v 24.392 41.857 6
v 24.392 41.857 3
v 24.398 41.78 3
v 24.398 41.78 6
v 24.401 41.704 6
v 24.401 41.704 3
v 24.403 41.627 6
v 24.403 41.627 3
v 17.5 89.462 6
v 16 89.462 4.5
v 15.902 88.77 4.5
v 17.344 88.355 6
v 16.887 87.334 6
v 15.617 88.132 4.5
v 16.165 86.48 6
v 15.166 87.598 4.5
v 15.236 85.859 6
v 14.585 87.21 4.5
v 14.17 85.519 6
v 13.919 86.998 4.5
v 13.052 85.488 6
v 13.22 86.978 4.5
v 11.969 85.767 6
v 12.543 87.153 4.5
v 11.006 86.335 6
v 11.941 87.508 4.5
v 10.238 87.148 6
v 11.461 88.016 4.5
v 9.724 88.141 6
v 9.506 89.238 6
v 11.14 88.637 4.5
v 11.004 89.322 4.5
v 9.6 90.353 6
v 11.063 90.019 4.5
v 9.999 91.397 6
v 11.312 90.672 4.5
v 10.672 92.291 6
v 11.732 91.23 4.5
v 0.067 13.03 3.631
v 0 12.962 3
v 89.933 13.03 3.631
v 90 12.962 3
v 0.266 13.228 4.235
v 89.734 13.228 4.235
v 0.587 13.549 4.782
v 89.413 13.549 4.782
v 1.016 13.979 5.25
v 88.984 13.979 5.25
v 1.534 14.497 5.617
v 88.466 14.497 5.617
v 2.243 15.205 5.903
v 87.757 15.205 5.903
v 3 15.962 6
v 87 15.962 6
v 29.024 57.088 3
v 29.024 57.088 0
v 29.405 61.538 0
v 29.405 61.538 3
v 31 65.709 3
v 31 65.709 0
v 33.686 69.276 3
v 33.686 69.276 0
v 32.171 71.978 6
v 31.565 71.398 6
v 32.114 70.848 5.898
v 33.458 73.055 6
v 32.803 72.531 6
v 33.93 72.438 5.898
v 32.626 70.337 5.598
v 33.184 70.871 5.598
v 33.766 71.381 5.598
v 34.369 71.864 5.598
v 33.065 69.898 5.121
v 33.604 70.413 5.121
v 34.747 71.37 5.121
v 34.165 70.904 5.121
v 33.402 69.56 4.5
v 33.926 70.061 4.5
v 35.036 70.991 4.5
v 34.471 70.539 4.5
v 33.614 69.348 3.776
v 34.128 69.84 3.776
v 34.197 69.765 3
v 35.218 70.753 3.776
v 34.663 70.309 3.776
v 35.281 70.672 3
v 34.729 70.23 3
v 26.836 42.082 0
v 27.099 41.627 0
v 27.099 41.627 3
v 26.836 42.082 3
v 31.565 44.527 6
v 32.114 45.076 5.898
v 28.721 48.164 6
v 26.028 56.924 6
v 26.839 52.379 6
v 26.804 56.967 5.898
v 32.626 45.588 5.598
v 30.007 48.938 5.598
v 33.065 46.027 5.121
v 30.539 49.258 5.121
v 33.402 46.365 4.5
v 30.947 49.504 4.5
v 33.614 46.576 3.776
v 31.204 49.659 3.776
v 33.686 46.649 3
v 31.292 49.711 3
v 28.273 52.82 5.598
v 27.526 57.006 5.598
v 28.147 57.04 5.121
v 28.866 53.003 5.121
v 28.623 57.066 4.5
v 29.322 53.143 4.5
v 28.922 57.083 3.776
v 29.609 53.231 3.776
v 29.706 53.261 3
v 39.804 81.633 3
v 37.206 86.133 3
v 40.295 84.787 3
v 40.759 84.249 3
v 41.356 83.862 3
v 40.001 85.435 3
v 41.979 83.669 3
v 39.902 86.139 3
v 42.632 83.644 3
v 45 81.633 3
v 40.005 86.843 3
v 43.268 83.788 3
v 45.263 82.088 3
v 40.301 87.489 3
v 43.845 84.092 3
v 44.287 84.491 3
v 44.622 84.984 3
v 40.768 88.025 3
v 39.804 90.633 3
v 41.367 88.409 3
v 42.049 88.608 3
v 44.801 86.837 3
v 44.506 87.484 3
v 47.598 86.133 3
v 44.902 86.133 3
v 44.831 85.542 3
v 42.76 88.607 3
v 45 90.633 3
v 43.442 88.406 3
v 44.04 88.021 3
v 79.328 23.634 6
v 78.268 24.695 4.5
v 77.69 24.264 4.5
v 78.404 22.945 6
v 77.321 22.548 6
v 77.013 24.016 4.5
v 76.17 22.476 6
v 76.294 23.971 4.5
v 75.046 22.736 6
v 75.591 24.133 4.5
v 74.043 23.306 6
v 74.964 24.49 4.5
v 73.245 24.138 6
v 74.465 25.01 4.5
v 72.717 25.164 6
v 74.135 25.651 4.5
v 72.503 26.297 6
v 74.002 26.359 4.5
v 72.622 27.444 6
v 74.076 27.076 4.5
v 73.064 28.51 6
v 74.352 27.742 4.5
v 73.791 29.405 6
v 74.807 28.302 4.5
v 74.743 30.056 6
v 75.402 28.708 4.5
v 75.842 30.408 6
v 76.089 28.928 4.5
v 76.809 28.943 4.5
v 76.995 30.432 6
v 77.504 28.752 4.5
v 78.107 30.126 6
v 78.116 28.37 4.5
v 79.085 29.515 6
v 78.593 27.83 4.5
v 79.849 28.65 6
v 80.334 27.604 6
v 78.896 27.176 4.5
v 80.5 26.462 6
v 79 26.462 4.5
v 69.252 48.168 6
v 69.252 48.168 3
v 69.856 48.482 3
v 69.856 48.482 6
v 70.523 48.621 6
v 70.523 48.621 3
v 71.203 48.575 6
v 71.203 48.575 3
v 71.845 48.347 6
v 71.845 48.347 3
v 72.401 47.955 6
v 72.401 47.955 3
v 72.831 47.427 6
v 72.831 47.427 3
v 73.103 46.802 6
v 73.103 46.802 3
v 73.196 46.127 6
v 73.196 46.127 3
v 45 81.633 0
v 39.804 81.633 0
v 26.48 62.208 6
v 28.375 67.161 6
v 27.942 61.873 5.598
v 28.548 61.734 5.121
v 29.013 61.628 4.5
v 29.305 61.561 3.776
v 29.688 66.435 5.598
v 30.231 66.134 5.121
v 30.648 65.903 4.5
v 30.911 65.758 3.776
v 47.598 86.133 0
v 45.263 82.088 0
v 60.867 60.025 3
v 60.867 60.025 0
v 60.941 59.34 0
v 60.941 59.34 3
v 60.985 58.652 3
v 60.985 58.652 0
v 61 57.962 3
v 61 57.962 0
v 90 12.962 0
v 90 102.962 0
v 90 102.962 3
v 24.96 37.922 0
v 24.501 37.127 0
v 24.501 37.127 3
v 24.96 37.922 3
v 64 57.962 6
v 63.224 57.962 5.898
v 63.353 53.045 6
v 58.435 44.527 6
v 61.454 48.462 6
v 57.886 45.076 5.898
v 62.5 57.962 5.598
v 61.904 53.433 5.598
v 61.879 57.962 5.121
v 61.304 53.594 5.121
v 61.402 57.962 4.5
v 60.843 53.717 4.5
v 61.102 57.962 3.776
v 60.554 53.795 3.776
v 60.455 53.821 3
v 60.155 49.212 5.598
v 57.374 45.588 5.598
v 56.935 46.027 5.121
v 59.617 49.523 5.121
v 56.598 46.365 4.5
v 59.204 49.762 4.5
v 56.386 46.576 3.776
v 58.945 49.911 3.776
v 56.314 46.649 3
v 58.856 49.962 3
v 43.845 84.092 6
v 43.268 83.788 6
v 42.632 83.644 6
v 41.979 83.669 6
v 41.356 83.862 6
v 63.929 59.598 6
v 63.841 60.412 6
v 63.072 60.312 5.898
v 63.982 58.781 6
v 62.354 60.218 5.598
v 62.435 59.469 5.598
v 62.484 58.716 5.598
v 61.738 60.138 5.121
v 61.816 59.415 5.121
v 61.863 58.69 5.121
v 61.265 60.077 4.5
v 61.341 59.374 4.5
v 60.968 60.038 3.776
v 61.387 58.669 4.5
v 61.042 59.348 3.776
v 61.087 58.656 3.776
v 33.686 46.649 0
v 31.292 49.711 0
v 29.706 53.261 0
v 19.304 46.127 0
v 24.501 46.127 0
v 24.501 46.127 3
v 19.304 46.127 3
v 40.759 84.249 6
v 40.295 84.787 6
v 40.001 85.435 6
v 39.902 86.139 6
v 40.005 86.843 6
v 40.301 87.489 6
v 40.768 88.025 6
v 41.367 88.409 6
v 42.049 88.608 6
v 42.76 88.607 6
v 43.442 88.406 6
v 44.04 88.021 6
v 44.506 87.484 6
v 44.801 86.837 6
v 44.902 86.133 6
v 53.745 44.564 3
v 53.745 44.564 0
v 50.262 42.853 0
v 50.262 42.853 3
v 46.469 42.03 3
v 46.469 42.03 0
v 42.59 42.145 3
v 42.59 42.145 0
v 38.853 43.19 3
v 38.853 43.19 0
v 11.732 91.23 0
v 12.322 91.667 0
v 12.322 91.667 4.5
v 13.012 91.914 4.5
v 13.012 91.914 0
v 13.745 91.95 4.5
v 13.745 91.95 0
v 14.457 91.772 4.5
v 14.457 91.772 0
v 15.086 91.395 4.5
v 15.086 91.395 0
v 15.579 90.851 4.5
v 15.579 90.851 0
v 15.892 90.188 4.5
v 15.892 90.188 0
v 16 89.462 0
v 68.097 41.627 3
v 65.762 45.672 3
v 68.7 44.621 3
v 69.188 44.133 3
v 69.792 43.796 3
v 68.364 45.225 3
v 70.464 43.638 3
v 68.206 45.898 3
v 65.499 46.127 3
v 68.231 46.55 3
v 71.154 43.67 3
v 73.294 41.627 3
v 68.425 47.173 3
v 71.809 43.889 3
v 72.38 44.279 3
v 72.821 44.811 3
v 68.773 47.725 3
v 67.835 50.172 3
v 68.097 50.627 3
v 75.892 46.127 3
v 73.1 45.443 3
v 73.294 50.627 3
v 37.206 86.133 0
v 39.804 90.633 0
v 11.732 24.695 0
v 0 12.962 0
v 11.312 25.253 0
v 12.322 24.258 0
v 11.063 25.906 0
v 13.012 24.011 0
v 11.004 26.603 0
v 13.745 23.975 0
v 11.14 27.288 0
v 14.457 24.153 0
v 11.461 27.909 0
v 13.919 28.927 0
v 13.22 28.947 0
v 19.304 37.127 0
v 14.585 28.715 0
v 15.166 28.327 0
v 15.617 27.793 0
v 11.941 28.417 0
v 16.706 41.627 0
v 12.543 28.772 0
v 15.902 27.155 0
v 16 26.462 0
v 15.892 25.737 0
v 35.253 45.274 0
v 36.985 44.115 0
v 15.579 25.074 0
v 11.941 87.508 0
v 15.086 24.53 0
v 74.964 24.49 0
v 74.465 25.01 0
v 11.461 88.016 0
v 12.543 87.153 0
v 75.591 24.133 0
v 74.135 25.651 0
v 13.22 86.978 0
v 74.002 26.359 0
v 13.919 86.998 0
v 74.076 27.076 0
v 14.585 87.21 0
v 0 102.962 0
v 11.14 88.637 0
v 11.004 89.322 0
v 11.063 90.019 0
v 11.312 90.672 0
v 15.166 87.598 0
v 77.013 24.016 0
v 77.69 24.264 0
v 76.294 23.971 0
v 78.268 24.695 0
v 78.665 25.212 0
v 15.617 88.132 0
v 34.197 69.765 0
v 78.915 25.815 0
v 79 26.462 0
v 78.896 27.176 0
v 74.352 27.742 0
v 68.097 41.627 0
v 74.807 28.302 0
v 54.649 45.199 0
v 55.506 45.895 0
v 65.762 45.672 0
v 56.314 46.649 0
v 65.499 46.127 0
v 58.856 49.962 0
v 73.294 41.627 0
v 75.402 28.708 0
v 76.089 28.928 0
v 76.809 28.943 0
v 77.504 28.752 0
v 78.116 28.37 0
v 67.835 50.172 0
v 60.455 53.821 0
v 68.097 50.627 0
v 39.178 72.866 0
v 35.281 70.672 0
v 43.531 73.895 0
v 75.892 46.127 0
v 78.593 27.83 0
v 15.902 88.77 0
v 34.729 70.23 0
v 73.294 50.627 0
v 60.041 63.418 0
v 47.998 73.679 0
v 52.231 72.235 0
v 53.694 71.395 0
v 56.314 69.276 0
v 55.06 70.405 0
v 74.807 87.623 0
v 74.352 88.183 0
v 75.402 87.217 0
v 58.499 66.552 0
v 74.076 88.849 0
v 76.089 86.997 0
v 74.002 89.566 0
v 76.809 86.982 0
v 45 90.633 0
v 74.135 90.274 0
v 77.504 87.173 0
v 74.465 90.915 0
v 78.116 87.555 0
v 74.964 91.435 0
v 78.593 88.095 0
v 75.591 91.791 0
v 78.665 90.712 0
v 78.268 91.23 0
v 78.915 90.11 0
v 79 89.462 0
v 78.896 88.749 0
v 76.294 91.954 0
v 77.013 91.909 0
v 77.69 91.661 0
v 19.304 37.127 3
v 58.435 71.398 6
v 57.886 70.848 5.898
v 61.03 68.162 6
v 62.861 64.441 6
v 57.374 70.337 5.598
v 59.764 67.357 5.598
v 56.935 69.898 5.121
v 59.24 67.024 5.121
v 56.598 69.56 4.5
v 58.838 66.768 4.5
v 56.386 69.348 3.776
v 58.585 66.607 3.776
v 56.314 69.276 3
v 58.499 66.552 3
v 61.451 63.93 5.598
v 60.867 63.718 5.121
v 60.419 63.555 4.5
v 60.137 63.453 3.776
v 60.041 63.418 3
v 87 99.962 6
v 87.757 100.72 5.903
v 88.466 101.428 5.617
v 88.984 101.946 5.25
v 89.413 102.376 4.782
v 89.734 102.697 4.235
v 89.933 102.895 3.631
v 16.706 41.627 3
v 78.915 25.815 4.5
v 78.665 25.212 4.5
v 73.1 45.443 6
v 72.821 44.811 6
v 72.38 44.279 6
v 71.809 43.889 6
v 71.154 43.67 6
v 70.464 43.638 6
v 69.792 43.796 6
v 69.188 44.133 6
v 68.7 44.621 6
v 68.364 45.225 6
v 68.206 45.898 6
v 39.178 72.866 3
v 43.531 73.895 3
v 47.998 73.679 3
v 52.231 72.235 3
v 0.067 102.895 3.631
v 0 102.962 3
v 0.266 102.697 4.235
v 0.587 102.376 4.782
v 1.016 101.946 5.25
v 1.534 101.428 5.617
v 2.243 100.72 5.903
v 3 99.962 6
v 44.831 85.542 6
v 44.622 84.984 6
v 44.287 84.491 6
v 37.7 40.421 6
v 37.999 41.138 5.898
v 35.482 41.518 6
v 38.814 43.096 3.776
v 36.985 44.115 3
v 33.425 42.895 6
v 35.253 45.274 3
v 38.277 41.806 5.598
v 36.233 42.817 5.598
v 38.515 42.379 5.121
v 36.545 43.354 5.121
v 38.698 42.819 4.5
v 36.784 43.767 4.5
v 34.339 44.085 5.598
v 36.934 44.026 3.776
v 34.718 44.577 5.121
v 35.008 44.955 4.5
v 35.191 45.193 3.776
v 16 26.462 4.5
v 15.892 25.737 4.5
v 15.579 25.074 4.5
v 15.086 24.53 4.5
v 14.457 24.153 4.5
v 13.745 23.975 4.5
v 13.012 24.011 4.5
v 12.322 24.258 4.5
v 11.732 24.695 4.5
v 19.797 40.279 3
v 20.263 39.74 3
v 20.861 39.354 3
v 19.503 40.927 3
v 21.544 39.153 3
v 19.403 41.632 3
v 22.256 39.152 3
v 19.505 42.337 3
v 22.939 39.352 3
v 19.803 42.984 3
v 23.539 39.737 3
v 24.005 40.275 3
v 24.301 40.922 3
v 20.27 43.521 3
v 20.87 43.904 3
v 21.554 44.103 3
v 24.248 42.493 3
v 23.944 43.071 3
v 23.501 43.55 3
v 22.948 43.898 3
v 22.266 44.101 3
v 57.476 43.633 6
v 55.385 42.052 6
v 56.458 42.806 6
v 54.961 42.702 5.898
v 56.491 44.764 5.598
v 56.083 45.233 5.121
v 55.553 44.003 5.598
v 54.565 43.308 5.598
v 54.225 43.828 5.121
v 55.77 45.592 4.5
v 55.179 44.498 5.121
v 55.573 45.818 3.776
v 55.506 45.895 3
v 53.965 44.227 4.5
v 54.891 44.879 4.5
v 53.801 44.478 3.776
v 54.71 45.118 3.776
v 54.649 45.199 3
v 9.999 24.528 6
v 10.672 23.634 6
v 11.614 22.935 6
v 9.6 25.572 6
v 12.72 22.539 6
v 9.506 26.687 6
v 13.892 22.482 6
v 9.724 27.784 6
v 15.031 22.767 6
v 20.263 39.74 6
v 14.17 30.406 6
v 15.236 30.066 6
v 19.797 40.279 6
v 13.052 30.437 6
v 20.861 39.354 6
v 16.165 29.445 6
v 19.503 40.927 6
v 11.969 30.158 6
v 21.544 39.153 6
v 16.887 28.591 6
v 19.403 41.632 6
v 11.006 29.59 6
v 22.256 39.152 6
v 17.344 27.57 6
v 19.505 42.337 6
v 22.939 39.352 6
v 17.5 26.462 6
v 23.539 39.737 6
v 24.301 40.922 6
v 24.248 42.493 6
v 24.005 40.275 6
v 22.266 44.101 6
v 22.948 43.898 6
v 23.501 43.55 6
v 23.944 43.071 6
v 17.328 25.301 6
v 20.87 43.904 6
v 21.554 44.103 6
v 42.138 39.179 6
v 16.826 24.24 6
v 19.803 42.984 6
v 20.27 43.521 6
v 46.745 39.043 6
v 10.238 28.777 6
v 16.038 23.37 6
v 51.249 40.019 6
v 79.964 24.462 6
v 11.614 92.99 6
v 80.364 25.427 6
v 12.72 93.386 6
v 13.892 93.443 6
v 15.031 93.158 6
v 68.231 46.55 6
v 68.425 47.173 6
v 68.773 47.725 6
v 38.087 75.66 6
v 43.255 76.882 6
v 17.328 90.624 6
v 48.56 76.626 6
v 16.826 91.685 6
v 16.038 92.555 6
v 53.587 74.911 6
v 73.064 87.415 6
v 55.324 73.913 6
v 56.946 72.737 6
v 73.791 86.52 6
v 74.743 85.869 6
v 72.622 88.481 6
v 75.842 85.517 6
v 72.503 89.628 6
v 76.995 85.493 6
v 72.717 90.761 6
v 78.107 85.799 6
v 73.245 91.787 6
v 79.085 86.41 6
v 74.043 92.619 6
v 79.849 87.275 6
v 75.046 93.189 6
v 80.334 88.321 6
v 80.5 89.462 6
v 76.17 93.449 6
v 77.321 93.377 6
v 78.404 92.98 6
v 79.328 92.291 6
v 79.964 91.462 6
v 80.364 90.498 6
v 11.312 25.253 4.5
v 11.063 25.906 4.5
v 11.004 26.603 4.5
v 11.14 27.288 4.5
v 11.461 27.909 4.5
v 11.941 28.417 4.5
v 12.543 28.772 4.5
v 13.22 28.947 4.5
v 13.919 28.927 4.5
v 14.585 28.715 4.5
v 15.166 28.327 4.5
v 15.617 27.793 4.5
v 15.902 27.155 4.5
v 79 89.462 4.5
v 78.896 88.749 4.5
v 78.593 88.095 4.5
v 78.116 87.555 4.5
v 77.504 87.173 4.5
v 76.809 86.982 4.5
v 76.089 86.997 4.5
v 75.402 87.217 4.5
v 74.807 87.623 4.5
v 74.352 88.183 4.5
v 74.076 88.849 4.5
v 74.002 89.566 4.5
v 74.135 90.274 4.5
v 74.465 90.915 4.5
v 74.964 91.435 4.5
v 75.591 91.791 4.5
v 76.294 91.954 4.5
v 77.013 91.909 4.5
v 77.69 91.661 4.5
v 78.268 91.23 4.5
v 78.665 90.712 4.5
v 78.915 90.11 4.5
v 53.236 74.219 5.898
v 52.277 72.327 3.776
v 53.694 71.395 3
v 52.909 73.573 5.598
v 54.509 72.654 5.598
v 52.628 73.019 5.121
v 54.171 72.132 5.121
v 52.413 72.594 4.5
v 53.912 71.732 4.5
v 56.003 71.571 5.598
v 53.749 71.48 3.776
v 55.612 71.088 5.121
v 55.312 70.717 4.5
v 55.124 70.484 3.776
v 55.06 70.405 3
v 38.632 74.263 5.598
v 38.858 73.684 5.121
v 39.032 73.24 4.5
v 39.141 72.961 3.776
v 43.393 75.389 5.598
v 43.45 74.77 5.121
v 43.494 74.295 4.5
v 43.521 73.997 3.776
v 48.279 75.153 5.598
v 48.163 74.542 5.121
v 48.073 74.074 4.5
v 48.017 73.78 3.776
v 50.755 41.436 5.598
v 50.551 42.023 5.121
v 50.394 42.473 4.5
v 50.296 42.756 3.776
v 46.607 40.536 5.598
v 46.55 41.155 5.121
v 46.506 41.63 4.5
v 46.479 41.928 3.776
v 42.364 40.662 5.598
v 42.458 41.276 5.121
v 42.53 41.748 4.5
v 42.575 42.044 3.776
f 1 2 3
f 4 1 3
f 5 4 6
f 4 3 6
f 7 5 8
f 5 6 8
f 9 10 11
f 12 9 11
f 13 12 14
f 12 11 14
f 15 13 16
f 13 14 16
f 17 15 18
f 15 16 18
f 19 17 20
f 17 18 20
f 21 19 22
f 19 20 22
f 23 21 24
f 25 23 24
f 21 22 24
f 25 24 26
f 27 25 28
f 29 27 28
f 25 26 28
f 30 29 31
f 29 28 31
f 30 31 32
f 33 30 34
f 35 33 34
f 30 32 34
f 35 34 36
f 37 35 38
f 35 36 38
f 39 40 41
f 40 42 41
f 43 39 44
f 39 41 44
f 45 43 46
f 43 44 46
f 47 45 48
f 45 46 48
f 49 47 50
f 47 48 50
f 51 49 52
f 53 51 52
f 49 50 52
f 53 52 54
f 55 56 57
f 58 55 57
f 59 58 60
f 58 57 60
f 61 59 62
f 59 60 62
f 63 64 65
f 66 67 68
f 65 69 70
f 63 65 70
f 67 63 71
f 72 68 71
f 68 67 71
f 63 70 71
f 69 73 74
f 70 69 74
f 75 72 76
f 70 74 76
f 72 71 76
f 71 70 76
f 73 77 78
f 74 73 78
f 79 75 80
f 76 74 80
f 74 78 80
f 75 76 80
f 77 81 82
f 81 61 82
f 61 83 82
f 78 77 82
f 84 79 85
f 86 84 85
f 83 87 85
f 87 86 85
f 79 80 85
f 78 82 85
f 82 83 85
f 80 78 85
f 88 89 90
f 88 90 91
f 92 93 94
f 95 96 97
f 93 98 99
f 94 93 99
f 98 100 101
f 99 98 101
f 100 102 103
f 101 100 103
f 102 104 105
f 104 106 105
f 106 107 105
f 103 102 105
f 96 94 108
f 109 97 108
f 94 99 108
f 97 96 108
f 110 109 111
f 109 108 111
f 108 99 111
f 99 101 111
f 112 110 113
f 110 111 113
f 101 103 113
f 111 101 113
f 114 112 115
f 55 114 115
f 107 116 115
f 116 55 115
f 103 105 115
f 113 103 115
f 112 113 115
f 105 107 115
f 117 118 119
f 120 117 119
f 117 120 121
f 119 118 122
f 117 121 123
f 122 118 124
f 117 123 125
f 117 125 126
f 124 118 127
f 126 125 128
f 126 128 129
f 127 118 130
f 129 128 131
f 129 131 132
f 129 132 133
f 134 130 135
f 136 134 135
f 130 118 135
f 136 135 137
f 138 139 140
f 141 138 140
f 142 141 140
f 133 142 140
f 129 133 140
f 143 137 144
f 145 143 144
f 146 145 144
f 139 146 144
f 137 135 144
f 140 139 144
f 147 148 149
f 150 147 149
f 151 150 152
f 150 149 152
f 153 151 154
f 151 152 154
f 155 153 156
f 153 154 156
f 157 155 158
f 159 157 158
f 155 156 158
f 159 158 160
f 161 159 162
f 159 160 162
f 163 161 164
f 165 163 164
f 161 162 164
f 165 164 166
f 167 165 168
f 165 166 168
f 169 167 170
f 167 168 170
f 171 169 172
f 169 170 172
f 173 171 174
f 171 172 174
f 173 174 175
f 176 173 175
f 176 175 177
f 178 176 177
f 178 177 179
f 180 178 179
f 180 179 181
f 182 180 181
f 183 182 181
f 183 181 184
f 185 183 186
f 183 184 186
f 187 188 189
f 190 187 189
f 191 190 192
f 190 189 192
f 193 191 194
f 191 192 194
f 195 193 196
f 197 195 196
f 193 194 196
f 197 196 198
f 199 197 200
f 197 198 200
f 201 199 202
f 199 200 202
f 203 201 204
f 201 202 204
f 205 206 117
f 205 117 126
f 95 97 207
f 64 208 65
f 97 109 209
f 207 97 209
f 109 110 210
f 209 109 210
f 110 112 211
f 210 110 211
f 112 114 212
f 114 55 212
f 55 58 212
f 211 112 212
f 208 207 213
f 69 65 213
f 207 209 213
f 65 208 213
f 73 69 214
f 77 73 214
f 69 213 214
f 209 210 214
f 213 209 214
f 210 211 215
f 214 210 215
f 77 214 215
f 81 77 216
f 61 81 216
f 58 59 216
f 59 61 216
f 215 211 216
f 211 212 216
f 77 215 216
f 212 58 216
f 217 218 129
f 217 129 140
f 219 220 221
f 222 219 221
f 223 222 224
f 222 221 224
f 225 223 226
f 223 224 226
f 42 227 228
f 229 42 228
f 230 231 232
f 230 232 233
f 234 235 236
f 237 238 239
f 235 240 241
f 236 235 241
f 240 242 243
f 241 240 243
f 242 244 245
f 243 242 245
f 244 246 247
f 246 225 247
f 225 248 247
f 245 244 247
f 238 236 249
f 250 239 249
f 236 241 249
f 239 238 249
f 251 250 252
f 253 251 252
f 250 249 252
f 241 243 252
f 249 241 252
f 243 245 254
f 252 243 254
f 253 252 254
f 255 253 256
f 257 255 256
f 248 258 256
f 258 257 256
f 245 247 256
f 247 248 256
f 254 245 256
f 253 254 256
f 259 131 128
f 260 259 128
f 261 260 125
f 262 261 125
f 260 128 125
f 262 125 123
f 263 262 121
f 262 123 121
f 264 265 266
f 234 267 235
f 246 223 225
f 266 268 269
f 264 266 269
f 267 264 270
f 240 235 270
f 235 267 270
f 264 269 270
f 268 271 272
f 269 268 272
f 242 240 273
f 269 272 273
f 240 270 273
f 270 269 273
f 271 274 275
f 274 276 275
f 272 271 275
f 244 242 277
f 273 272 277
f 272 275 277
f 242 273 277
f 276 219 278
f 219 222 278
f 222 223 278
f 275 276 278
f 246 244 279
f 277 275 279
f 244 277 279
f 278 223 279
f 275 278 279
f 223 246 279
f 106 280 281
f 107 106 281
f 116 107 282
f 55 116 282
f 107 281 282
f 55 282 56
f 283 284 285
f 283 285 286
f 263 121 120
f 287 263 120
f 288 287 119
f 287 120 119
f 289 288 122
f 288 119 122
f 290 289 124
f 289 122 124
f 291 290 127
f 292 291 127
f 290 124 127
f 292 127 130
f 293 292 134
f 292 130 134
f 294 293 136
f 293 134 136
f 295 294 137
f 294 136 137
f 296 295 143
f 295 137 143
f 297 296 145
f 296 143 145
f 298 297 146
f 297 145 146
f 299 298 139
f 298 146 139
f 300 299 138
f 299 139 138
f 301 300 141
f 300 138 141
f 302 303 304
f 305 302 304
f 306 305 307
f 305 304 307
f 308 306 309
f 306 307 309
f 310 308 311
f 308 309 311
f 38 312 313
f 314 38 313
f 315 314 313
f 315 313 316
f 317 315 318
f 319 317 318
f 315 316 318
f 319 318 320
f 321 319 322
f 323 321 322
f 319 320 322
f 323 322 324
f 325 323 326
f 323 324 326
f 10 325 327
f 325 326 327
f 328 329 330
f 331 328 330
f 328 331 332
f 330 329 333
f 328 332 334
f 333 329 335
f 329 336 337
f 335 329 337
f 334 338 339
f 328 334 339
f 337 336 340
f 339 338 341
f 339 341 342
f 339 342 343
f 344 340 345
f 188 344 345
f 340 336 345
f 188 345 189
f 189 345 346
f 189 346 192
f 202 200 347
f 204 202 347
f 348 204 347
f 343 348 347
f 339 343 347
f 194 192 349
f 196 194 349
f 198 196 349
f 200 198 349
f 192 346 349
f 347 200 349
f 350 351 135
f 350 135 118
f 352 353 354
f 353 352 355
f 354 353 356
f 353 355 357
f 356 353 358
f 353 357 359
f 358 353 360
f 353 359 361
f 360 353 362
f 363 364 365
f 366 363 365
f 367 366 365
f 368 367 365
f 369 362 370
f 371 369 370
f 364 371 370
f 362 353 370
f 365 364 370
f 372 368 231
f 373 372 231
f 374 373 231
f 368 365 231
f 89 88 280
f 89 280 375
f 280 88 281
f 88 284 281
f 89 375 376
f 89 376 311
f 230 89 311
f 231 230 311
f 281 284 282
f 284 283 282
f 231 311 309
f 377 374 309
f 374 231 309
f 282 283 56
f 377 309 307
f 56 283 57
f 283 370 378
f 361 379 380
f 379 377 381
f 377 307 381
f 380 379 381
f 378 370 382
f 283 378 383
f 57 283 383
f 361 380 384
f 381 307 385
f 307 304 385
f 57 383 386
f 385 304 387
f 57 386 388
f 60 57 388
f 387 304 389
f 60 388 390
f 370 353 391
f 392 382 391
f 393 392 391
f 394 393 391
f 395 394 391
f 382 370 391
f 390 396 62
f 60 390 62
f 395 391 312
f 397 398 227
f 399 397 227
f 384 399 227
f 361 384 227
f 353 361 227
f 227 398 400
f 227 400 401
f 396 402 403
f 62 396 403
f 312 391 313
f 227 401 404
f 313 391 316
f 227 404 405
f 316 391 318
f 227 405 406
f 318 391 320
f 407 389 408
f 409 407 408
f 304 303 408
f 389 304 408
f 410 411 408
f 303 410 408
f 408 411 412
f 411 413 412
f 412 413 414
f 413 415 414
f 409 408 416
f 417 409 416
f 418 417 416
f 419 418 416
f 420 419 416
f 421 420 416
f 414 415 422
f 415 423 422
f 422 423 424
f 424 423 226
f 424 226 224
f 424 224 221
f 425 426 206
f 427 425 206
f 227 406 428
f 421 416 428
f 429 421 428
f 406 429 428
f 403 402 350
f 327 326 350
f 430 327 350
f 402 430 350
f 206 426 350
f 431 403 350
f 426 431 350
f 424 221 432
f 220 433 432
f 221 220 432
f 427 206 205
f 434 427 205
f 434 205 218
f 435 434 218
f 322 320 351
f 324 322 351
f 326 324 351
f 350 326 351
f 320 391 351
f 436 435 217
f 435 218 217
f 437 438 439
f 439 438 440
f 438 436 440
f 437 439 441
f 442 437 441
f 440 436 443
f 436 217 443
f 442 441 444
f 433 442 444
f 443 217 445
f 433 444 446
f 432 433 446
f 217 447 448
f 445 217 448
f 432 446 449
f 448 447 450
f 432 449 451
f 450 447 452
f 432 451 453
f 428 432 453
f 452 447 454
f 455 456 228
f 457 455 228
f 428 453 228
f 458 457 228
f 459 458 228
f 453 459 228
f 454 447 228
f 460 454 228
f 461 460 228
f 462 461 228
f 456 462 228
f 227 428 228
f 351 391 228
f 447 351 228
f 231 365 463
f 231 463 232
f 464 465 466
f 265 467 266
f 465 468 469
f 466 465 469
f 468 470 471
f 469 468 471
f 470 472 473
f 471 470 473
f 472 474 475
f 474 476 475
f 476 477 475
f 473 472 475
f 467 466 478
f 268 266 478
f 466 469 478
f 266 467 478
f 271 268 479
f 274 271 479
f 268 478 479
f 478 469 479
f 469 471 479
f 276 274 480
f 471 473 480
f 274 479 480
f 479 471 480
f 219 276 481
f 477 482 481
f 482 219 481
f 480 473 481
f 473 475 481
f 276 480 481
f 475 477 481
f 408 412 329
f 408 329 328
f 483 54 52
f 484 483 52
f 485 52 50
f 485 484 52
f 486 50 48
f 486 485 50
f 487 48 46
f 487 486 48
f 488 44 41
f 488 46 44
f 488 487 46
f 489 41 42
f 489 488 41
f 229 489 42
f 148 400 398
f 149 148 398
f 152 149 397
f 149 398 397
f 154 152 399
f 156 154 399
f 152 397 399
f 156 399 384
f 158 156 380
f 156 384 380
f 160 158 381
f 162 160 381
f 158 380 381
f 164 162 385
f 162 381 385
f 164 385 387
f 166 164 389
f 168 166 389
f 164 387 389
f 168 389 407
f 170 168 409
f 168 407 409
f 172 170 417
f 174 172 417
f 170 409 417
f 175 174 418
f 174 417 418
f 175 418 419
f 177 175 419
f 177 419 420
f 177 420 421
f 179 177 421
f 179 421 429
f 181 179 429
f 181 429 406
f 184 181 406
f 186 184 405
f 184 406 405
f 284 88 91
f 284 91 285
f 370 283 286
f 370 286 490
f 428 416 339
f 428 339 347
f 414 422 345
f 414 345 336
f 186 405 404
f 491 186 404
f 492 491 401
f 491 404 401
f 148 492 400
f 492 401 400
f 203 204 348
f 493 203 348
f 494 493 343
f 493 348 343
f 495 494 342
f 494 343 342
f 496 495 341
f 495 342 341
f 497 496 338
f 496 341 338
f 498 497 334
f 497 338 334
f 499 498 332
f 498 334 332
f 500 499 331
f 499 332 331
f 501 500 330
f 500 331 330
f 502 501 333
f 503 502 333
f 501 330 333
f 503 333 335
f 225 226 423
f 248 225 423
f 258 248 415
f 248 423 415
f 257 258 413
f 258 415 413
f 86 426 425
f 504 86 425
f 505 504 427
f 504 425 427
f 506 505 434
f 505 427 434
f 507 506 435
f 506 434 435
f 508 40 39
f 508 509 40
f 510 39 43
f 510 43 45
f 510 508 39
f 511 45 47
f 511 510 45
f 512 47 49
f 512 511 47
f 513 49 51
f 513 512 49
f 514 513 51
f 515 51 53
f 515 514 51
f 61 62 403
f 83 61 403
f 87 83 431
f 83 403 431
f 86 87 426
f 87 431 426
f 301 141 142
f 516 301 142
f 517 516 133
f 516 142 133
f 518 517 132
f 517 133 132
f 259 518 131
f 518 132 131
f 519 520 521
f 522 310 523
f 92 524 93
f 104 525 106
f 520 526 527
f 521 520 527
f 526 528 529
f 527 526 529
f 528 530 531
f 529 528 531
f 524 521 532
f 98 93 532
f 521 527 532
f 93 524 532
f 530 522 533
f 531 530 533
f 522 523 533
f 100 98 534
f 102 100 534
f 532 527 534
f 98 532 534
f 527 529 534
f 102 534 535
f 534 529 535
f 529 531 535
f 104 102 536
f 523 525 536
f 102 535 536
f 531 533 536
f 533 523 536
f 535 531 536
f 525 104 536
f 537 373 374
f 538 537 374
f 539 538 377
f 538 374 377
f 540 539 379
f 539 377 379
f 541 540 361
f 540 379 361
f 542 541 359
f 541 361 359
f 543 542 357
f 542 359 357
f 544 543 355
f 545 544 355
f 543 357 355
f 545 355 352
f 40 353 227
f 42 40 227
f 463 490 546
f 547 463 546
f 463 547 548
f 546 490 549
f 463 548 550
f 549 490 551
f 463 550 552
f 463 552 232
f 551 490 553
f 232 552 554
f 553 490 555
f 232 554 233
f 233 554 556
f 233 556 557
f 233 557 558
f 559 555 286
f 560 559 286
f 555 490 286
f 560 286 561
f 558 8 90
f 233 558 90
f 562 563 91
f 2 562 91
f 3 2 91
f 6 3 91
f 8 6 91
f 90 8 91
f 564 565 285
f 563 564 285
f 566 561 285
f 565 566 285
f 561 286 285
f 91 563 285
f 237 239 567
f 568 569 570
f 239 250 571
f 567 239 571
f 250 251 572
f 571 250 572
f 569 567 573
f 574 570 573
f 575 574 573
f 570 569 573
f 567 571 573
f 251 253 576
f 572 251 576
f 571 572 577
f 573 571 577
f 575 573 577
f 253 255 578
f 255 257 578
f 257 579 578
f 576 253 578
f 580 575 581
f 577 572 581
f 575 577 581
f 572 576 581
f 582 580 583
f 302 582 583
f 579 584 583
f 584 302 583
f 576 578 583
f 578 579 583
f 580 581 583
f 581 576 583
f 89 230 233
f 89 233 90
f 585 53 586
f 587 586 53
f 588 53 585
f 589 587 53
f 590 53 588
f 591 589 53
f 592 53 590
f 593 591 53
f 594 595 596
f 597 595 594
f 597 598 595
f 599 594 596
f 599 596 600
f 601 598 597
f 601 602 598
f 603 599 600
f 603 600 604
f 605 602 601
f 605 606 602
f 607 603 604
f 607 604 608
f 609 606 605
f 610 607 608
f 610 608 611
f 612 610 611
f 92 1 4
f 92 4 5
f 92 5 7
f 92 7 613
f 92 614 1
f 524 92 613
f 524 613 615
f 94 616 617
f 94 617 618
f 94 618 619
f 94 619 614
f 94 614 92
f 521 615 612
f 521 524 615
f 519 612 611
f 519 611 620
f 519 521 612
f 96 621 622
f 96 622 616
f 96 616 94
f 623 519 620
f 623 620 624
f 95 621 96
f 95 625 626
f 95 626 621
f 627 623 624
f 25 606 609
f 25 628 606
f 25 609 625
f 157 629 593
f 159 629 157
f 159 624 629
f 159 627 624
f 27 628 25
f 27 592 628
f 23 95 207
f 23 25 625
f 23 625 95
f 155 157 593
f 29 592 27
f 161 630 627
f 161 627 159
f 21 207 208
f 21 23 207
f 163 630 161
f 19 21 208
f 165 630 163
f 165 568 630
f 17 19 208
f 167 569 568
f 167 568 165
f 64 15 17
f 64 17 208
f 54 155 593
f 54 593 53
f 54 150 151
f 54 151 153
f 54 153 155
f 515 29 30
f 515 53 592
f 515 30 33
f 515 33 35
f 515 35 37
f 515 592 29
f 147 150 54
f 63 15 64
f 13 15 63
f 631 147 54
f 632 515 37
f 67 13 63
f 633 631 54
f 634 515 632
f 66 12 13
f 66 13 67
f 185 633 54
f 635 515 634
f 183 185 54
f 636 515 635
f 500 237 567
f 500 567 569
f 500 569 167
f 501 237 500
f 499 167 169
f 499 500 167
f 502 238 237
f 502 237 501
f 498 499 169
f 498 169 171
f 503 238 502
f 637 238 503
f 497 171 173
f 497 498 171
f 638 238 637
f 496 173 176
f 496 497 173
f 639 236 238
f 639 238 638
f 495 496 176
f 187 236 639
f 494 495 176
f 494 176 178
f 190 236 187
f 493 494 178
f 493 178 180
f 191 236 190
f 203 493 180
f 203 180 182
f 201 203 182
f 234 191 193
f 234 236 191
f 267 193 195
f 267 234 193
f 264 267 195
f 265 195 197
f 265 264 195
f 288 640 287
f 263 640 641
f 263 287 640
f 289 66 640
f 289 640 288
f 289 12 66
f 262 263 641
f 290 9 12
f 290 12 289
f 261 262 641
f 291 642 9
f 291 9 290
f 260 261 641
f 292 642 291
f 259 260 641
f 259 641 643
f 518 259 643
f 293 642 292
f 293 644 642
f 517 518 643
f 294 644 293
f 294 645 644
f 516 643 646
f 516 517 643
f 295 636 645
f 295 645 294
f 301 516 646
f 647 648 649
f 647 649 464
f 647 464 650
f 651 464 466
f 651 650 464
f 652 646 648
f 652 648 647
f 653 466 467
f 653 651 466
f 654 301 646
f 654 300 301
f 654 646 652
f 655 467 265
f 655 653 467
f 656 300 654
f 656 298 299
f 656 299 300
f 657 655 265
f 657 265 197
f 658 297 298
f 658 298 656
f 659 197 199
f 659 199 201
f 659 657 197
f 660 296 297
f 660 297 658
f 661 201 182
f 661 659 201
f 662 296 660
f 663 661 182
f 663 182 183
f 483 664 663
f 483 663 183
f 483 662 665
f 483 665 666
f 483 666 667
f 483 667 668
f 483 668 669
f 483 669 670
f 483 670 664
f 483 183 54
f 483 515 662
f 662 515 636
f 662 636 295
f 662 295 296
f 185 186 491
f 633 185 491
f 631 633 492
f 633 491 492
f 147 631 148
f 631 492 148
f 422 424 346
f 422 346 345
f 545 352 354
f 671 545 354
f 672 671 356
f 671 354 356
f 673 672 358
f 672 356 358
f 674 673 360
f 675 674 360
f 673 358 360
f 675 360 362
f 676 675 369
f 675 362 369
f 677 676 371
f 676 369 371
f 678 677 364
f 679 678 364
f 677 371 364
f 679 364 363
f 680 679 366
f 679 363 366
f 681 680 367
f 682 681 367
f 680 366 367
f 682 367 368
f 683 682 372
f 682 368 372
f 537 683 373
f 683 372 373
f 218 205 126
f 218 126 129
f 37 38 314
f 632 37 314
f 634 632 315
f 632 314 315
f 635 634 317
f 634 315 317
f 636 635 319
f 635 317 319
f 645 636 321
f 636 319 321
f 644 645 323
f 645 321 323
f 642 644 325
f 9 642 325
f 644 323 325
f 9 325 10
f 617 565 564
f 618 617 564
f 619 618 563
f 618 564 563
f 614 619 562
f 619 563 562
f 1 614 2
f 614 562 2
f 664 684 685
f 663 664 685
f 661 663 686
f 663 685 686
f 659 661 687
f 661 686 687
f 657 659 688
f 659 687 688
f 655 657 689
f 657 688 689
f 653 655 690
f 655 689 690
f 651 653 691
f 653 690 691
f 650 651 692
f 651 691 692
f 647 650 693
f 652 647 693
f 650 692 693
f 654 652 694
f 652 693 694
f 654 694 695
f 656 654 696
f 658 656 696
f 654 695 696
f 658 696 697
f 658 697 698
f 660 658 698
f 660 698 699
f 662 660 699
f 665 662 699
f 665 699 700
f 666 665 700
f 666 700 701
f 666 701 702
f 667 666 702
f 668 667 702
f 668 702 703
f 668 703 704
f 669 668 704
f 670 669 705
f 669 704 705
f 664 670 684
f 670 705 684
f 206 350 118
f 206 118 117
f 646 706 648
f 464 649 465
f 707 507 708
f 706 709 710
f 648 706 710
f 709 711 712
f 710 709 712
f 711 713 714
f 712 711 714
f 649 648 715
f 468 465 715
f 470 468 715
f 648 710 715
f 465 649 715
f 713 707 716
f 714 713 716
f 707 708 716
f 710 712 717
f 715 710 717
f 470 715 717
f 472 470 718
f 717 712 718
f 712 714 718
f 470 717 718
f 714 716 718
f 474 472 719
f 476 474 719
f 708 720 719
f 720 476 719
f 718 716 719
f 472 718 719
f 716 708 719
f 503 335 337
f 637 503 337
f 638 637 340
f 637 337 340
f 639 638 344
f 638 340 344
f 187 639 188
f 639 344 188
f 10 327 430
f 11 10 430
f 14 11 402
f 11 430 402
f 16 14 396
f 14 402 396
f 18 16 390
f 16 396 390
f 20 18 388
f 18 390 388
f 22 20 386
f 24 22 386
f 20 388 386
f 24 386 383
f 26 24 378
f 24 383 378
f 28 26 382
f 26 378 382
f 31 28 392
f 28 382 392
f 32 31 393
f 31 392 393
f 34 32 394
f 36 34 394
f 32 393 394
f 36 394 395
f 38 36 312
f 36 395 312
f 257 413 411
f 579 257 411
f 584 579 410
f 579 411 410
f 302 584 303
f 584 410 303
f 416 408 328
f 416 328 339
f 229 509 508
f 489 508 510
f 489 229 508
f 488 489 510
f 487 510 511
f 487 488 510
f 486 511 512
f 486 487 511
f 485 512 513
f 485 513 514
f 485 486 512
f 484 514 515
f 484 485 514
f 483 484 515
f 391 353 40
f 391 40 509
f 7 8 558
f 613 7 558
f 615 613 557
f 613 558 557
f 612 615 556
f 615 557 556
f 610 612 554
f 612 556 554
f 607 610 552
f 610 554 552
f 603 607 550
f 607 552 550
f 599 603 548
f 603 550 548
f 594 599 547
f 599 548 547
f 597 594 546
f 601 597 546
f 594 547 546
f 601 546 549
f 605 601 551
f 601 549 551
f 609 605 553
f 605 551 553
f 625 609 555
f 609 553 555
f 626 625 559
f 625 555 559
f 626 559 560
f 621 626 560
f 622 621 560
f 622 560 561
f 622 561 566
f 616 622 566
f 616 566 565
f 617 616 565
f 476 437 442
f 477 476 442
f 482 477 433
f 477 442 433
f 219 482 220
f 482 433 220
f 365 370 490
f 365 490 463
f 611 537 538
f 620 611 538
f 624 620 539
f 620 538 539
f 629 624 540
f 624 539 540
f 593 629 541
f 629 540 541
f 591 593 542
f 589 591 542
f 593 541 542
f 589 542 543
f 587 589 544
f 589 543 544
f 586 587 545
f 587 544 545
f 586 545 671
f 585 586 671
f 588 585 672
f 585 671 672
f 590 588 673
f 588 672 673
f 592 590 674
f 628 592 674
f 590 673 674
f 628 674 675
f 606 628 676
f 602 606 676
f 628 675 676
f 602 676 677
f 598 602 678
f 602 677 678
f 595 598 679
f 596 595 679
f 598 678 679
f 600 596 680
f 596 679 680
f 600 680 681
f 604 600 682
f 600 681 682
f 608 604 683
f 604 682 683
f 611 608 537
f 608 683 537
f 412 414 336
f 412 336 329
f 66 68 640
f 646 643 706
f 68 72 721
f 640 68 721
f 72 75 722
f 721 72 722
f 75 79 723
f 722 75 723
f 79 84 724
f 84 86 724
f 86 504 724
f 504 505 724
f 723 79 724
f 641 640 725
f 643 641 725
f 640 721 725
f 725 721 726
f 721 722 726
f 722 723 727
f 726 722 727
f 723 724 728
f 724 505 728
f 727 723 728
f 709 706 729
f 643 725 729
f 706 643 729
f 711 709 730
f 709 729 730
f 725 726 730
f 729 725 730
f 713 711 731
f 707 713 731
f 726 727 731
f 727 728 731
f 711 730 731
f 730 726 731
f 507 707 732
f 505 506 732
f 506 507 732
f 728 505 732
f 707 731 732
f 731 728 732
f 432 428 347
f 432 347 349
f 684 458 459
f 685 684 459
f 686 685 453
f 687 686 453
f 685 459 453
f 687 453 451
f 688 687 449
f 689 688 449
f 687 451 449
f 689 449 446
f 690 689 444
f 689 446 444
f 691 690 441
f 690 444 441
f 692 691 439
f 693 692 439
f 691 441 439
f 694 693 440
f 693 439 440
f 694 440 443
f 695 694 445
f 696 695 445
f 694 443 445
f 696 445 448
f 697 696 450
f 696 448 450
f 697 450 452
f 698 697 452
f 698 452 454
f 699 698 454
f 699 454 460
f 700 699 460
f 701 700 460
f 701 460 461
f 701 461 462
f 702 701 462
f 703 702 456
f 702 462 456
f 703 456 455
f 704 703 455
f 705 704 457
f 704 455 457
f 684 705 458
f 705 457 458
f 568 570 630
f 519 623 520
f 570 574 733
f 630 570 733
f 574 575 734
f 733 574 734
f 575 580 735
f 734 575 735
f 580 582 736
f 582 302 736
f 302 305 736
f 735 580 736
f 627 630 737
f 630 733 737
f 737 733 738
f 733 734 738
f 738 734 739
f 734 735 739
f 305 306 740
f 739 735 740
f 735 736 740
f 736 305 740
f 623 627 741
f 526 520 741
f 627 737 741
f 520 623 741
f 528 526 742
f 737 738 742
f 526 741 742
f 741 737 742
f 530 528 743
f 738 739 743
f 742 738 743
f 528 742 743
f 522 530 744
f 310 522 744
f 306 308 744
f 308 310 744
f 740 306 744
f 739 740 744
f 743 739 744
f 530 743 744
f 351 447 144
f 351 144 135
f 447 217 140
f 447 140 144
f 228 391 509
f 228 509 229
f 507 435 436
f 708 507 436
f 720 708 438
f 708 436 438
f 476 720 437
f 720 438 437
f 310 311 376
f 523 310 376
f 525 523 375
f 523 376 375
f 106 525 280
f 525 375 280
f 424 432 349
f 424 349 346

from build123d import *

# Parameters (mm, degrees)
F0_W     = 90
F0_H     = 90
F1_DEPTH = 6
F2_DEPTH = 3
F3_R     = 3
F4_SIZE  = 1.5


with BuildPart() as f1:
    # F0 (on Top) → F1 (new body)
    with BuildSketch(Plane.XY):
        with Locations((45, 57.9624775852)):
            Rectangle(F0_W, F0_H)
        with BuildLine():
            ThreePointArc((16, 26.4624775852), (14.4567085809, 24.152778754), (11.732233047, 24.6947106323))
            ThreePointArc((11.732233047, 24.6947106323), (12.5432914191, 28.7721764165), (16, 26.4624775852))
        make_face(mode=Mode.SUBTRACT)
        with BuildLine():
            ThreePointArc((79, 26.4624775852), (78.8096988313, 25.5057690043), (78.267766953, 24.6947106323))
            ThreePointArc((78.267766953, 24.6947106323), (74.1903011687, 27.4191861662), (79, 26.4624775852))
        make_face(mode=Mode.SUBTRACT)
        with BuildLine():
            ThreePointArc((16, 89.4624775852), (12.5432914191, 87.152778754), (11.732233047, 91.2302445382))
            ThreePointArc((11.732233047, 91.2302445382), (14.4567085809, 91.7721764165), (16, 89.4624775852))
        make_face(mode=Mode.SUBTRACT)
        with BuildLine():
            Line((65.762042471, 45.6721763201), (53.7451824967, 44.5639036649))
            ThreePointArc((53.7451824967, 44.5639036649), (46.4693877551, 42.0300923393), (38.8528937147, 43.190440342))
            Line((38.8528937147, 43.190440342), (26.8360337403, 42.0821676867))
            Line((26.8360337403, 42.0821676867), (27.0987256205, 41.6271720034))
            Line((27.0987256205, 41.6271720034), (24.9595724614, 37.9220500467))
            Line((24.9595724614, 37.9220500467), (24.5006494092, 37.1271720034))
            Line((24.5006494092, 37.1271720034), (19.3044969865, 37.1271720034))
            Line((19.3044969865, 37.1271720034), (16.7064207751, 41.6271720034))
            Line((16.7064207751, 41.6271720034), (19.3044969865, 46.1271720034))
            Line((19.3044969865, 46.1271720034), (23.9752656487, 46.1271720034))
            Line((23.9752656487, 46.1271720034), (29.0239033621, 57.0882143426))
            ThreePointArc((29.0239033621, 57.0882143426), (30.0561039252, 63.6791173416), (33.686291501, 69.2761860842))
            ThreePointArc((33.686291501, 69.2761860842), (34.4603089777, 70.0005386067), (35.2805936243, 70.6720464098))
            Line((35.2805936243, 70.6720464098), (40.3292313377, 81.6330887489))
            Line((40.3292313377, 81.6330887489), (39.8038475773, 81.6330887489))
            Line((39.8038475773, 81.6330887489), (37.2057713659, 86.1330887489))
            Line((37.2057713659, 86.1330887489), (39.8038475773, 90.6330887489))
            Line((39.8038475773, 90.6330887489), (45, 90.6330887489))
            Line((45, 90.6330887489), (47.5980762114, 86.1330887489))
            Line((47.5980762114, 86.1330887489), (45.2626918802, 82.0880844322))
            Line((45.2626918802, 82.0880844322), (52.2309141412, 72.2353147483))
            ThreePointArc((52.2309141412, 72.2353147483), (54.3896148925, 70.9175975064), (56.313708499, 69.2761860842))
            ThreePointArc((56.313708499, 69.2761860842), (59.3557468051, 65.0273578863), (60.866512661, 60.024946004))
            Line((60.866512661, 60.024946004), (67.8347349219, 50.1721763201))
            Line((67.8347349219, 50.1721763201), (68.0974268022, 50.6271720034))
            Line((68.0974268022, 50.6271720034), (73.2935792249, 50.6271720034))
            Line((73.2935792249, 50.6271720034), (75.8916554362, 46.1271720034))
            Line((75.8916554362, 46.1271720034), (73.2935792249, 41.6271720034))
            Line((73.2935792249, 41.6271720034), (68.0974268022, 41.6271720034))
            Line((68.0974268022, 41.6271720034), (65.762042471, 45.6721763201))
        make_face(mode=Mode.SUBTRACT)
        with BuildLine():
            ThreePointArc((79, 89.4624775852), (74.1903011687, 88.5057690043), (78.267766953, 91.2302445382))
            ThreePointArc((78.267766953, 91.2302445382), (78.8096988313, 90.4191861662), (79, 89.4624775852))
        make_face(mode=Mode.SUBTRACT)
        with BuildLine():
            Line((26.8360337403, 42.0821676867), (38.8528937147, 43.190440342))
            ThreePointArc((38.8528937147, 43.190440342), (36.099998727, 44.6662383673), (33.686291501, 46.6487690863))
            ThreePointArc((33.686291501, 46.6487690863), (30.3907950108, 51.4378220707), (29.0239033621, 57.0882143426))
            Line((29.0239033621, 57.0882143426), (23.9752656487, 46.1271720034))
            Line((23.9752656487, 46.1271720034), (24.5006494092, 46.1271720034))
            Line((24.5006494092, 46.1271720034), (26.8360337403, 42.0821676867))
        make_face()
        with BuildLine():
            Line((40.3292313377, 81.6330887489), (35.2805936243, 70.6720464098))
            ThreePointArc((35.2805936243, 70.6720464098), (43.5306122449, 73.8948628312), (52.2309141412, 72.2353147483))
            Line((52.2309141412, 72.2353147483), (45.2626918802, 82.0880844322))
            Line((45.2626918802, 82.0880844322), (45, 81.6330887489))
            Line((45, 81.6330887489), (40.3292313377, 81.6330887489))
        make_face()
        with BuildLine():
            ThreePointArc((61, 57.9624775852), (59.7820725202, 51.8395426674), (56.313708499, 46.6487690863))
            ThreePointArc((56.313708499, 46.6487690863), (55.0834737541, 45.5397742945), (53.7451824967, 44.5639036649))
            Line((53.7451824967, 44.5639036649), (65.762042471, 45.6721763201))
            Line((65.762042471, 45.6721763201), (65.4993505908, 46.1271720034))
            Line((65.4993505908, 46.1271720034), (67.8347349219, 50.1721763201))
            Line((67.8347349219, 50.1721763201), (60.866512661, 60.024946004))
            ThreePointArc((60.866512661, 60.024946004), (60.96659329, 58.9958694335), (61, 57.9624775852))
        make_face()
        with BuildLine():
            Line((39.8038475773, 81.6330887489), (40.3292313377, 81.6330887489))
            Line((40.3292313377, 81.6330887489), (41.3560385544, 83.8623787109))
            ThreePointArc((41.3560385544, 83.8623787109), (41.0537237081, 88.2384050061), (44.9019237886, 86.1330887489))
            ThreePointArc((44.9019237886, 86.1330887489), (44.6221574364, 84.9839314274), (43.8454737491, 84.0919705476))
            Line((43.8454737491, 84.0919705476), (45.2626918802, 82.0880844322))
            Line((45.2626918802, 82.0880844322), (47.5980762114, 86.1330887489))
            Line((47.5980762114, 86.1330887489), (45, 90.6330887489))
            Line((45, 90.6330887489), (39.8038475773, 90.6330887489))
            Line((39.8038475773, 90.6330887489), (37.2057713659, 86.1330887489))
            Line((37.2057713659, 86.1330887489), (39.8038475773, 81.6330887489))
        make_face()
        with BuildLine():
            Line((27.0987256205, 41.6271720034), (26.8360337403, 42.0821676867))
            Line((26.8360337403, 42.0821676867), (24.3920083925, 41.8567638402))
            ThreePointArc((24.3920083925, 41.8567638402), (24.3999305998, 41.742089394), (24.4025731978, 41.6271720034))
            ThreePointArc((24.4025731978, 41.6271720034), (19.7972569406, 40.2789719229), (22.9484584321, 43.8978820415))
            Line((22.9484584321, 43.8978820415), (23.9752656487, 46.1271720034))
            Line((23.9752656487, 46.1271720034), (19.3044969865, 46.1271720034))
            Line((19.3044969865, 46.1271720034), (16.7064207751, 41.6271720034))
            Line((16.7064207751, 41.6271720034), (19.3044969865, 37.1271720034))
            Line((19.3044969865, 37.1271720034), (24.5006494092, 37.1271720034))
            Line((24.5006494092, 37.1271720034), (24.9595724614, 37.9220500467))
            Line((24.9595724614, 37.9220500467), (27.0987256205, 41.6271720034))
        make_face()
        with BuildLine():
            Line((68.2060678188, 45.8975801667), (65.762042471, 45.6721763201))
            Line((65.762042471, 45.6721763201), (68.0974268022, 41.6271720034))
            Line((68.0974268022, 41.6271720034), (73.2935792249, 41.6271720034))
            Line((73.2935792249, 41.6271720034), (75.8916554362, 46.1271720034))
            Line((75.8916554362, 46.1271720034), (73.2935792249, 50.6271720034))
            Line((73.2935792249, 50.6271720034), (68.0974268022, 50.6271720034))
            Line((68.0974268022, 50.6271720034), (67.8347349219, 50.1721763201))
            Line((67.8347349219, 50.1721763201), (69.2519530531, 48.1682902047))
            ThreePointArc((69.2519530531, 48.1682902047), (71.844660335, 48.3474056512), (73.1955030135, 46.1271720034))
            ThreePointArc((73.1955030135, 46.1271720034), (70.8104204041, 43.6298146014), (68.2060678188, 45.8975801667))
        make_face()
        with BuildLine():
            Line((41.3560385544, 83.8623787109), (40.3292313377, 81.6330887489))
            Line((40.3292313377, 81.6330887489), (45, 81.6330887489))
            Line((45, 81.6330887489), (45.2626918802, 82.0880844322))
            Line((45.2626918802, 82.0880844322), (43.8454737491, 84.0919705476))
            ThreePointArc((43.8454737491, 84.0919705476), (42.6315156254, 83.6436535542), (41.3560385544, 83.8623787109))
        make_face()
        with BuildLine():
            Line((24.3920083925, 41.8567638402), (26.8360337403, 42.0821676867))
            Line((26.8360337403, 42.0821676867), (24.5006494092, 46.1271720034))
            Line((24.5006494092, 46.1271720034), (23.9752656487, 46.1271720034))
            Line((23.9752656487, 46.1271720034), (22.9484584321, 43.8978820415))
            ThreePointArc((22.9484584321, 43.8978820415), (23.9436913991, 43.0707219639), (24.3920083925, 41.8567638402))
        make_face()
        with BuildLine():
            Line((65.4993505908, 46.1271720034), (65.762042471, 45.6721763201))
            Line((65.762042471, 45.6721763201), (68.2060678188, 45.8975801667))
            ThreePointArc((68.2060678188, 45.8975801667), (68.4247929755, 47.1730572377), (69.2519530531, 48.1682902047))
            Line((69.2519530531, 48.1682902047), (67.8347349219, 50.1721763201))
            Line((67.8347349219, 50.1721763201), (65.4993505908, 46.1271720034))
        make_face()
    extrude(amount=F1_DEPTH)

    # F0 (on Top) → F2 (cut)
    with BuildSketch(Plane.XY):
        with BuildLine():
            Line((41.3560385544, 83.8623787109), (40.3292313377, 81.6330887489))
            Line((40.3292313377, 81.6330887489), (45, 81.6330887489))
            Line((45, 81.6330887489), (45.2626918802, 82.0880844322))
            Line((45.2626918802, 82.0880844322), (43.8454737491, 84.0919705476))
            ThreePointArc((43.8454737491, 84.0919705476), (42.6315156254, 83.6436535542), (41.3560385544, 83.8623787109))
        make_face()
        with BuildLine():
            Line((39.8038475773, 81.6330887489), (40.3292313377, 81.6330887489))
            Line((40.3292313377, 81.6330887489), (41.3560385544, 83.8623787109))
            ThreePointArc((41.3560385544, 83.8623787109), (41.0537237081, 88.2384050061), (44.9019237886, 86.1330887489))
            ThreePointArc((44.9019237886, 86.1330887489), (44.6221574364, 84.9839314274), (43.8454737491, 84.0919705476))
            Line((43.8454737491, 84.0919705476), (45.2626918802, 82.0880844322))
            Line((45.2626918802, 82.0880844322), (47.5980762114, 86.1330887489))
            Line((47.5980762114, 86.1330887489), (45, 90.6330887489))
            Line((45, 90.6330887489), (39.8038475773, 90.6330887489))
            Line((39.8038475773, 90.6330887489), (37.2057713659, 86.1330887489))
            Line((37.2057713659, 86.1330887489), (39.8038475773, 81.6330887489))
        make_face()
        with BuildLine():
            Line((24.3920083925, 41.8567638402), (26.8360337403, 42.0821676867))
            Line((26.8360337403, 42.0821676867), (24.5006494092, 46.1271720034))
            Line((24.5006494092, 46.1271720034), (23.9752656487, 46.1271720034))
            Line((23.9752656487, 46.1271720034), (22.9484584321, 43.8978820415))
            ThreePointArc((22.9484584321, 43.8978820415), (23.9436913991, 43.0707219639), (24.3920083925, 41.8567638402))
        make_face()
        with BuildLine():
            Line((27.0987256205, 41.6271720034), (26.8360337403, 42.0821676867))
            Line((26.8360337403, 42.0821676867), (24.3920083925, 41.8567638402))
            ThreePointArc((24.3920083925, 41.8567638402), (24.3999305998, 41.742089394), (24.4025731978, 41.6271720034))
            ThreePointArc((24.4025731978, 41.6271720034), (19.7972569406, 40.2789719229), (22.9484584321, 43.8978820415))
            Line((22.9484584321, 43.8978820415), (23.9752656487, 46.1271720034))
            Line((23.9752656487, 46.1271720034), (19.3044969865, 46.1271720034))
            Line((19.3044969865, 46.1271720034), (16.7064207751, 41.6271720034))
            Line((16.7064207751, 41.6271720034), (19.3044969865, 37.1271720034))
            Line((19.3044969865, 37.1271720034), (24.5006494092, 37.1271720034))
            Line((24.5006494092, 37.1271720034), (24.9595724614, 37.9220500467))
            Line((24.9595724614, 37.9220500467), (27.0987256205, 41.6271720034))
        make_face()
        with BuildLine():
            Line((65.4993505908, 46.1271720034), (65.762042471, 45.6721763201))
            Line((65.762042471, 45.6721763201), (68.2060678188, 45.8975801667))
            ThreePointArc((68.2060678188, 45.8975801667), (68.4247929755, 47.1730572377), (69.2519530531, 48.1682902047))
            Line((69.2519530531, 48.1682902047), (67.8347349219, 50.1721763201))
            Line((67.8347349219, 50.1721763201), (65.4993505908, 46.1271720034))
        make_face()
        with BuildLine():
            Line((68.2060678188, 45.8975801667), (65.762042471, 45.6721763201))
            Line((65.762042471, 45.6721763201), (68.0974268022, 41.6271720034))
            Line((68.0974268022, 41.6271720034), (73.2935792249, 41.6271720034))
            Line((73.2935792249, 41.6271720034), (75.8916554362, 46.1271720034))
            Line((75.8916554362, 46.1271720034), (73.2935792249, 50.6271720034))
            Line((73.2935792249, 50.6271720034), (68.0974268022, 50.6271720034))
            Line((68.0974268022, 50.6271720034), (67.8347349219, 50.1721763201))
            Line((67.8347349219, 50.1721763201), (69.2519530531, 48.1682902047))
            ThreePointArc((69.2519530531, 48.1682902047), (71.844660335, 48.3474056512), (73.1955030135, 46.1271720034))
            ThreePointArc((73.1955030135, 46.1271720034), (70.8104204041, 43.6298146014), (68.2060678188, 45.8975801667))
        make_face()
    extrude(amount=F2_DEPTH, mode=Mode.SUBTRACT)

    # F3
    f3_edges = [f1.edges().sort_by_distance(p)[0] for p in [
        (0, 57.962478, 6),
        (45, 12.962478, 6),
        (45, 102.962478, 6),
        (90, 57.962478, 6),
        (29.133487, 55.900009, 6),
    ]]
    fillet(f3_edges, radius=F3_R)

    # F4
    f4_edges = [f1.edges().sort_by_distance(p)[0] for p in [
        (11, 89.462478, 6),
        (74, 89.462478, 6),
        (74.732233, 28.230245, 6),
        (15.267767, 28.230245, 6),
    ]]
    chamfer(f4_edges, length=F4_SIZE)


solid = f1.part
